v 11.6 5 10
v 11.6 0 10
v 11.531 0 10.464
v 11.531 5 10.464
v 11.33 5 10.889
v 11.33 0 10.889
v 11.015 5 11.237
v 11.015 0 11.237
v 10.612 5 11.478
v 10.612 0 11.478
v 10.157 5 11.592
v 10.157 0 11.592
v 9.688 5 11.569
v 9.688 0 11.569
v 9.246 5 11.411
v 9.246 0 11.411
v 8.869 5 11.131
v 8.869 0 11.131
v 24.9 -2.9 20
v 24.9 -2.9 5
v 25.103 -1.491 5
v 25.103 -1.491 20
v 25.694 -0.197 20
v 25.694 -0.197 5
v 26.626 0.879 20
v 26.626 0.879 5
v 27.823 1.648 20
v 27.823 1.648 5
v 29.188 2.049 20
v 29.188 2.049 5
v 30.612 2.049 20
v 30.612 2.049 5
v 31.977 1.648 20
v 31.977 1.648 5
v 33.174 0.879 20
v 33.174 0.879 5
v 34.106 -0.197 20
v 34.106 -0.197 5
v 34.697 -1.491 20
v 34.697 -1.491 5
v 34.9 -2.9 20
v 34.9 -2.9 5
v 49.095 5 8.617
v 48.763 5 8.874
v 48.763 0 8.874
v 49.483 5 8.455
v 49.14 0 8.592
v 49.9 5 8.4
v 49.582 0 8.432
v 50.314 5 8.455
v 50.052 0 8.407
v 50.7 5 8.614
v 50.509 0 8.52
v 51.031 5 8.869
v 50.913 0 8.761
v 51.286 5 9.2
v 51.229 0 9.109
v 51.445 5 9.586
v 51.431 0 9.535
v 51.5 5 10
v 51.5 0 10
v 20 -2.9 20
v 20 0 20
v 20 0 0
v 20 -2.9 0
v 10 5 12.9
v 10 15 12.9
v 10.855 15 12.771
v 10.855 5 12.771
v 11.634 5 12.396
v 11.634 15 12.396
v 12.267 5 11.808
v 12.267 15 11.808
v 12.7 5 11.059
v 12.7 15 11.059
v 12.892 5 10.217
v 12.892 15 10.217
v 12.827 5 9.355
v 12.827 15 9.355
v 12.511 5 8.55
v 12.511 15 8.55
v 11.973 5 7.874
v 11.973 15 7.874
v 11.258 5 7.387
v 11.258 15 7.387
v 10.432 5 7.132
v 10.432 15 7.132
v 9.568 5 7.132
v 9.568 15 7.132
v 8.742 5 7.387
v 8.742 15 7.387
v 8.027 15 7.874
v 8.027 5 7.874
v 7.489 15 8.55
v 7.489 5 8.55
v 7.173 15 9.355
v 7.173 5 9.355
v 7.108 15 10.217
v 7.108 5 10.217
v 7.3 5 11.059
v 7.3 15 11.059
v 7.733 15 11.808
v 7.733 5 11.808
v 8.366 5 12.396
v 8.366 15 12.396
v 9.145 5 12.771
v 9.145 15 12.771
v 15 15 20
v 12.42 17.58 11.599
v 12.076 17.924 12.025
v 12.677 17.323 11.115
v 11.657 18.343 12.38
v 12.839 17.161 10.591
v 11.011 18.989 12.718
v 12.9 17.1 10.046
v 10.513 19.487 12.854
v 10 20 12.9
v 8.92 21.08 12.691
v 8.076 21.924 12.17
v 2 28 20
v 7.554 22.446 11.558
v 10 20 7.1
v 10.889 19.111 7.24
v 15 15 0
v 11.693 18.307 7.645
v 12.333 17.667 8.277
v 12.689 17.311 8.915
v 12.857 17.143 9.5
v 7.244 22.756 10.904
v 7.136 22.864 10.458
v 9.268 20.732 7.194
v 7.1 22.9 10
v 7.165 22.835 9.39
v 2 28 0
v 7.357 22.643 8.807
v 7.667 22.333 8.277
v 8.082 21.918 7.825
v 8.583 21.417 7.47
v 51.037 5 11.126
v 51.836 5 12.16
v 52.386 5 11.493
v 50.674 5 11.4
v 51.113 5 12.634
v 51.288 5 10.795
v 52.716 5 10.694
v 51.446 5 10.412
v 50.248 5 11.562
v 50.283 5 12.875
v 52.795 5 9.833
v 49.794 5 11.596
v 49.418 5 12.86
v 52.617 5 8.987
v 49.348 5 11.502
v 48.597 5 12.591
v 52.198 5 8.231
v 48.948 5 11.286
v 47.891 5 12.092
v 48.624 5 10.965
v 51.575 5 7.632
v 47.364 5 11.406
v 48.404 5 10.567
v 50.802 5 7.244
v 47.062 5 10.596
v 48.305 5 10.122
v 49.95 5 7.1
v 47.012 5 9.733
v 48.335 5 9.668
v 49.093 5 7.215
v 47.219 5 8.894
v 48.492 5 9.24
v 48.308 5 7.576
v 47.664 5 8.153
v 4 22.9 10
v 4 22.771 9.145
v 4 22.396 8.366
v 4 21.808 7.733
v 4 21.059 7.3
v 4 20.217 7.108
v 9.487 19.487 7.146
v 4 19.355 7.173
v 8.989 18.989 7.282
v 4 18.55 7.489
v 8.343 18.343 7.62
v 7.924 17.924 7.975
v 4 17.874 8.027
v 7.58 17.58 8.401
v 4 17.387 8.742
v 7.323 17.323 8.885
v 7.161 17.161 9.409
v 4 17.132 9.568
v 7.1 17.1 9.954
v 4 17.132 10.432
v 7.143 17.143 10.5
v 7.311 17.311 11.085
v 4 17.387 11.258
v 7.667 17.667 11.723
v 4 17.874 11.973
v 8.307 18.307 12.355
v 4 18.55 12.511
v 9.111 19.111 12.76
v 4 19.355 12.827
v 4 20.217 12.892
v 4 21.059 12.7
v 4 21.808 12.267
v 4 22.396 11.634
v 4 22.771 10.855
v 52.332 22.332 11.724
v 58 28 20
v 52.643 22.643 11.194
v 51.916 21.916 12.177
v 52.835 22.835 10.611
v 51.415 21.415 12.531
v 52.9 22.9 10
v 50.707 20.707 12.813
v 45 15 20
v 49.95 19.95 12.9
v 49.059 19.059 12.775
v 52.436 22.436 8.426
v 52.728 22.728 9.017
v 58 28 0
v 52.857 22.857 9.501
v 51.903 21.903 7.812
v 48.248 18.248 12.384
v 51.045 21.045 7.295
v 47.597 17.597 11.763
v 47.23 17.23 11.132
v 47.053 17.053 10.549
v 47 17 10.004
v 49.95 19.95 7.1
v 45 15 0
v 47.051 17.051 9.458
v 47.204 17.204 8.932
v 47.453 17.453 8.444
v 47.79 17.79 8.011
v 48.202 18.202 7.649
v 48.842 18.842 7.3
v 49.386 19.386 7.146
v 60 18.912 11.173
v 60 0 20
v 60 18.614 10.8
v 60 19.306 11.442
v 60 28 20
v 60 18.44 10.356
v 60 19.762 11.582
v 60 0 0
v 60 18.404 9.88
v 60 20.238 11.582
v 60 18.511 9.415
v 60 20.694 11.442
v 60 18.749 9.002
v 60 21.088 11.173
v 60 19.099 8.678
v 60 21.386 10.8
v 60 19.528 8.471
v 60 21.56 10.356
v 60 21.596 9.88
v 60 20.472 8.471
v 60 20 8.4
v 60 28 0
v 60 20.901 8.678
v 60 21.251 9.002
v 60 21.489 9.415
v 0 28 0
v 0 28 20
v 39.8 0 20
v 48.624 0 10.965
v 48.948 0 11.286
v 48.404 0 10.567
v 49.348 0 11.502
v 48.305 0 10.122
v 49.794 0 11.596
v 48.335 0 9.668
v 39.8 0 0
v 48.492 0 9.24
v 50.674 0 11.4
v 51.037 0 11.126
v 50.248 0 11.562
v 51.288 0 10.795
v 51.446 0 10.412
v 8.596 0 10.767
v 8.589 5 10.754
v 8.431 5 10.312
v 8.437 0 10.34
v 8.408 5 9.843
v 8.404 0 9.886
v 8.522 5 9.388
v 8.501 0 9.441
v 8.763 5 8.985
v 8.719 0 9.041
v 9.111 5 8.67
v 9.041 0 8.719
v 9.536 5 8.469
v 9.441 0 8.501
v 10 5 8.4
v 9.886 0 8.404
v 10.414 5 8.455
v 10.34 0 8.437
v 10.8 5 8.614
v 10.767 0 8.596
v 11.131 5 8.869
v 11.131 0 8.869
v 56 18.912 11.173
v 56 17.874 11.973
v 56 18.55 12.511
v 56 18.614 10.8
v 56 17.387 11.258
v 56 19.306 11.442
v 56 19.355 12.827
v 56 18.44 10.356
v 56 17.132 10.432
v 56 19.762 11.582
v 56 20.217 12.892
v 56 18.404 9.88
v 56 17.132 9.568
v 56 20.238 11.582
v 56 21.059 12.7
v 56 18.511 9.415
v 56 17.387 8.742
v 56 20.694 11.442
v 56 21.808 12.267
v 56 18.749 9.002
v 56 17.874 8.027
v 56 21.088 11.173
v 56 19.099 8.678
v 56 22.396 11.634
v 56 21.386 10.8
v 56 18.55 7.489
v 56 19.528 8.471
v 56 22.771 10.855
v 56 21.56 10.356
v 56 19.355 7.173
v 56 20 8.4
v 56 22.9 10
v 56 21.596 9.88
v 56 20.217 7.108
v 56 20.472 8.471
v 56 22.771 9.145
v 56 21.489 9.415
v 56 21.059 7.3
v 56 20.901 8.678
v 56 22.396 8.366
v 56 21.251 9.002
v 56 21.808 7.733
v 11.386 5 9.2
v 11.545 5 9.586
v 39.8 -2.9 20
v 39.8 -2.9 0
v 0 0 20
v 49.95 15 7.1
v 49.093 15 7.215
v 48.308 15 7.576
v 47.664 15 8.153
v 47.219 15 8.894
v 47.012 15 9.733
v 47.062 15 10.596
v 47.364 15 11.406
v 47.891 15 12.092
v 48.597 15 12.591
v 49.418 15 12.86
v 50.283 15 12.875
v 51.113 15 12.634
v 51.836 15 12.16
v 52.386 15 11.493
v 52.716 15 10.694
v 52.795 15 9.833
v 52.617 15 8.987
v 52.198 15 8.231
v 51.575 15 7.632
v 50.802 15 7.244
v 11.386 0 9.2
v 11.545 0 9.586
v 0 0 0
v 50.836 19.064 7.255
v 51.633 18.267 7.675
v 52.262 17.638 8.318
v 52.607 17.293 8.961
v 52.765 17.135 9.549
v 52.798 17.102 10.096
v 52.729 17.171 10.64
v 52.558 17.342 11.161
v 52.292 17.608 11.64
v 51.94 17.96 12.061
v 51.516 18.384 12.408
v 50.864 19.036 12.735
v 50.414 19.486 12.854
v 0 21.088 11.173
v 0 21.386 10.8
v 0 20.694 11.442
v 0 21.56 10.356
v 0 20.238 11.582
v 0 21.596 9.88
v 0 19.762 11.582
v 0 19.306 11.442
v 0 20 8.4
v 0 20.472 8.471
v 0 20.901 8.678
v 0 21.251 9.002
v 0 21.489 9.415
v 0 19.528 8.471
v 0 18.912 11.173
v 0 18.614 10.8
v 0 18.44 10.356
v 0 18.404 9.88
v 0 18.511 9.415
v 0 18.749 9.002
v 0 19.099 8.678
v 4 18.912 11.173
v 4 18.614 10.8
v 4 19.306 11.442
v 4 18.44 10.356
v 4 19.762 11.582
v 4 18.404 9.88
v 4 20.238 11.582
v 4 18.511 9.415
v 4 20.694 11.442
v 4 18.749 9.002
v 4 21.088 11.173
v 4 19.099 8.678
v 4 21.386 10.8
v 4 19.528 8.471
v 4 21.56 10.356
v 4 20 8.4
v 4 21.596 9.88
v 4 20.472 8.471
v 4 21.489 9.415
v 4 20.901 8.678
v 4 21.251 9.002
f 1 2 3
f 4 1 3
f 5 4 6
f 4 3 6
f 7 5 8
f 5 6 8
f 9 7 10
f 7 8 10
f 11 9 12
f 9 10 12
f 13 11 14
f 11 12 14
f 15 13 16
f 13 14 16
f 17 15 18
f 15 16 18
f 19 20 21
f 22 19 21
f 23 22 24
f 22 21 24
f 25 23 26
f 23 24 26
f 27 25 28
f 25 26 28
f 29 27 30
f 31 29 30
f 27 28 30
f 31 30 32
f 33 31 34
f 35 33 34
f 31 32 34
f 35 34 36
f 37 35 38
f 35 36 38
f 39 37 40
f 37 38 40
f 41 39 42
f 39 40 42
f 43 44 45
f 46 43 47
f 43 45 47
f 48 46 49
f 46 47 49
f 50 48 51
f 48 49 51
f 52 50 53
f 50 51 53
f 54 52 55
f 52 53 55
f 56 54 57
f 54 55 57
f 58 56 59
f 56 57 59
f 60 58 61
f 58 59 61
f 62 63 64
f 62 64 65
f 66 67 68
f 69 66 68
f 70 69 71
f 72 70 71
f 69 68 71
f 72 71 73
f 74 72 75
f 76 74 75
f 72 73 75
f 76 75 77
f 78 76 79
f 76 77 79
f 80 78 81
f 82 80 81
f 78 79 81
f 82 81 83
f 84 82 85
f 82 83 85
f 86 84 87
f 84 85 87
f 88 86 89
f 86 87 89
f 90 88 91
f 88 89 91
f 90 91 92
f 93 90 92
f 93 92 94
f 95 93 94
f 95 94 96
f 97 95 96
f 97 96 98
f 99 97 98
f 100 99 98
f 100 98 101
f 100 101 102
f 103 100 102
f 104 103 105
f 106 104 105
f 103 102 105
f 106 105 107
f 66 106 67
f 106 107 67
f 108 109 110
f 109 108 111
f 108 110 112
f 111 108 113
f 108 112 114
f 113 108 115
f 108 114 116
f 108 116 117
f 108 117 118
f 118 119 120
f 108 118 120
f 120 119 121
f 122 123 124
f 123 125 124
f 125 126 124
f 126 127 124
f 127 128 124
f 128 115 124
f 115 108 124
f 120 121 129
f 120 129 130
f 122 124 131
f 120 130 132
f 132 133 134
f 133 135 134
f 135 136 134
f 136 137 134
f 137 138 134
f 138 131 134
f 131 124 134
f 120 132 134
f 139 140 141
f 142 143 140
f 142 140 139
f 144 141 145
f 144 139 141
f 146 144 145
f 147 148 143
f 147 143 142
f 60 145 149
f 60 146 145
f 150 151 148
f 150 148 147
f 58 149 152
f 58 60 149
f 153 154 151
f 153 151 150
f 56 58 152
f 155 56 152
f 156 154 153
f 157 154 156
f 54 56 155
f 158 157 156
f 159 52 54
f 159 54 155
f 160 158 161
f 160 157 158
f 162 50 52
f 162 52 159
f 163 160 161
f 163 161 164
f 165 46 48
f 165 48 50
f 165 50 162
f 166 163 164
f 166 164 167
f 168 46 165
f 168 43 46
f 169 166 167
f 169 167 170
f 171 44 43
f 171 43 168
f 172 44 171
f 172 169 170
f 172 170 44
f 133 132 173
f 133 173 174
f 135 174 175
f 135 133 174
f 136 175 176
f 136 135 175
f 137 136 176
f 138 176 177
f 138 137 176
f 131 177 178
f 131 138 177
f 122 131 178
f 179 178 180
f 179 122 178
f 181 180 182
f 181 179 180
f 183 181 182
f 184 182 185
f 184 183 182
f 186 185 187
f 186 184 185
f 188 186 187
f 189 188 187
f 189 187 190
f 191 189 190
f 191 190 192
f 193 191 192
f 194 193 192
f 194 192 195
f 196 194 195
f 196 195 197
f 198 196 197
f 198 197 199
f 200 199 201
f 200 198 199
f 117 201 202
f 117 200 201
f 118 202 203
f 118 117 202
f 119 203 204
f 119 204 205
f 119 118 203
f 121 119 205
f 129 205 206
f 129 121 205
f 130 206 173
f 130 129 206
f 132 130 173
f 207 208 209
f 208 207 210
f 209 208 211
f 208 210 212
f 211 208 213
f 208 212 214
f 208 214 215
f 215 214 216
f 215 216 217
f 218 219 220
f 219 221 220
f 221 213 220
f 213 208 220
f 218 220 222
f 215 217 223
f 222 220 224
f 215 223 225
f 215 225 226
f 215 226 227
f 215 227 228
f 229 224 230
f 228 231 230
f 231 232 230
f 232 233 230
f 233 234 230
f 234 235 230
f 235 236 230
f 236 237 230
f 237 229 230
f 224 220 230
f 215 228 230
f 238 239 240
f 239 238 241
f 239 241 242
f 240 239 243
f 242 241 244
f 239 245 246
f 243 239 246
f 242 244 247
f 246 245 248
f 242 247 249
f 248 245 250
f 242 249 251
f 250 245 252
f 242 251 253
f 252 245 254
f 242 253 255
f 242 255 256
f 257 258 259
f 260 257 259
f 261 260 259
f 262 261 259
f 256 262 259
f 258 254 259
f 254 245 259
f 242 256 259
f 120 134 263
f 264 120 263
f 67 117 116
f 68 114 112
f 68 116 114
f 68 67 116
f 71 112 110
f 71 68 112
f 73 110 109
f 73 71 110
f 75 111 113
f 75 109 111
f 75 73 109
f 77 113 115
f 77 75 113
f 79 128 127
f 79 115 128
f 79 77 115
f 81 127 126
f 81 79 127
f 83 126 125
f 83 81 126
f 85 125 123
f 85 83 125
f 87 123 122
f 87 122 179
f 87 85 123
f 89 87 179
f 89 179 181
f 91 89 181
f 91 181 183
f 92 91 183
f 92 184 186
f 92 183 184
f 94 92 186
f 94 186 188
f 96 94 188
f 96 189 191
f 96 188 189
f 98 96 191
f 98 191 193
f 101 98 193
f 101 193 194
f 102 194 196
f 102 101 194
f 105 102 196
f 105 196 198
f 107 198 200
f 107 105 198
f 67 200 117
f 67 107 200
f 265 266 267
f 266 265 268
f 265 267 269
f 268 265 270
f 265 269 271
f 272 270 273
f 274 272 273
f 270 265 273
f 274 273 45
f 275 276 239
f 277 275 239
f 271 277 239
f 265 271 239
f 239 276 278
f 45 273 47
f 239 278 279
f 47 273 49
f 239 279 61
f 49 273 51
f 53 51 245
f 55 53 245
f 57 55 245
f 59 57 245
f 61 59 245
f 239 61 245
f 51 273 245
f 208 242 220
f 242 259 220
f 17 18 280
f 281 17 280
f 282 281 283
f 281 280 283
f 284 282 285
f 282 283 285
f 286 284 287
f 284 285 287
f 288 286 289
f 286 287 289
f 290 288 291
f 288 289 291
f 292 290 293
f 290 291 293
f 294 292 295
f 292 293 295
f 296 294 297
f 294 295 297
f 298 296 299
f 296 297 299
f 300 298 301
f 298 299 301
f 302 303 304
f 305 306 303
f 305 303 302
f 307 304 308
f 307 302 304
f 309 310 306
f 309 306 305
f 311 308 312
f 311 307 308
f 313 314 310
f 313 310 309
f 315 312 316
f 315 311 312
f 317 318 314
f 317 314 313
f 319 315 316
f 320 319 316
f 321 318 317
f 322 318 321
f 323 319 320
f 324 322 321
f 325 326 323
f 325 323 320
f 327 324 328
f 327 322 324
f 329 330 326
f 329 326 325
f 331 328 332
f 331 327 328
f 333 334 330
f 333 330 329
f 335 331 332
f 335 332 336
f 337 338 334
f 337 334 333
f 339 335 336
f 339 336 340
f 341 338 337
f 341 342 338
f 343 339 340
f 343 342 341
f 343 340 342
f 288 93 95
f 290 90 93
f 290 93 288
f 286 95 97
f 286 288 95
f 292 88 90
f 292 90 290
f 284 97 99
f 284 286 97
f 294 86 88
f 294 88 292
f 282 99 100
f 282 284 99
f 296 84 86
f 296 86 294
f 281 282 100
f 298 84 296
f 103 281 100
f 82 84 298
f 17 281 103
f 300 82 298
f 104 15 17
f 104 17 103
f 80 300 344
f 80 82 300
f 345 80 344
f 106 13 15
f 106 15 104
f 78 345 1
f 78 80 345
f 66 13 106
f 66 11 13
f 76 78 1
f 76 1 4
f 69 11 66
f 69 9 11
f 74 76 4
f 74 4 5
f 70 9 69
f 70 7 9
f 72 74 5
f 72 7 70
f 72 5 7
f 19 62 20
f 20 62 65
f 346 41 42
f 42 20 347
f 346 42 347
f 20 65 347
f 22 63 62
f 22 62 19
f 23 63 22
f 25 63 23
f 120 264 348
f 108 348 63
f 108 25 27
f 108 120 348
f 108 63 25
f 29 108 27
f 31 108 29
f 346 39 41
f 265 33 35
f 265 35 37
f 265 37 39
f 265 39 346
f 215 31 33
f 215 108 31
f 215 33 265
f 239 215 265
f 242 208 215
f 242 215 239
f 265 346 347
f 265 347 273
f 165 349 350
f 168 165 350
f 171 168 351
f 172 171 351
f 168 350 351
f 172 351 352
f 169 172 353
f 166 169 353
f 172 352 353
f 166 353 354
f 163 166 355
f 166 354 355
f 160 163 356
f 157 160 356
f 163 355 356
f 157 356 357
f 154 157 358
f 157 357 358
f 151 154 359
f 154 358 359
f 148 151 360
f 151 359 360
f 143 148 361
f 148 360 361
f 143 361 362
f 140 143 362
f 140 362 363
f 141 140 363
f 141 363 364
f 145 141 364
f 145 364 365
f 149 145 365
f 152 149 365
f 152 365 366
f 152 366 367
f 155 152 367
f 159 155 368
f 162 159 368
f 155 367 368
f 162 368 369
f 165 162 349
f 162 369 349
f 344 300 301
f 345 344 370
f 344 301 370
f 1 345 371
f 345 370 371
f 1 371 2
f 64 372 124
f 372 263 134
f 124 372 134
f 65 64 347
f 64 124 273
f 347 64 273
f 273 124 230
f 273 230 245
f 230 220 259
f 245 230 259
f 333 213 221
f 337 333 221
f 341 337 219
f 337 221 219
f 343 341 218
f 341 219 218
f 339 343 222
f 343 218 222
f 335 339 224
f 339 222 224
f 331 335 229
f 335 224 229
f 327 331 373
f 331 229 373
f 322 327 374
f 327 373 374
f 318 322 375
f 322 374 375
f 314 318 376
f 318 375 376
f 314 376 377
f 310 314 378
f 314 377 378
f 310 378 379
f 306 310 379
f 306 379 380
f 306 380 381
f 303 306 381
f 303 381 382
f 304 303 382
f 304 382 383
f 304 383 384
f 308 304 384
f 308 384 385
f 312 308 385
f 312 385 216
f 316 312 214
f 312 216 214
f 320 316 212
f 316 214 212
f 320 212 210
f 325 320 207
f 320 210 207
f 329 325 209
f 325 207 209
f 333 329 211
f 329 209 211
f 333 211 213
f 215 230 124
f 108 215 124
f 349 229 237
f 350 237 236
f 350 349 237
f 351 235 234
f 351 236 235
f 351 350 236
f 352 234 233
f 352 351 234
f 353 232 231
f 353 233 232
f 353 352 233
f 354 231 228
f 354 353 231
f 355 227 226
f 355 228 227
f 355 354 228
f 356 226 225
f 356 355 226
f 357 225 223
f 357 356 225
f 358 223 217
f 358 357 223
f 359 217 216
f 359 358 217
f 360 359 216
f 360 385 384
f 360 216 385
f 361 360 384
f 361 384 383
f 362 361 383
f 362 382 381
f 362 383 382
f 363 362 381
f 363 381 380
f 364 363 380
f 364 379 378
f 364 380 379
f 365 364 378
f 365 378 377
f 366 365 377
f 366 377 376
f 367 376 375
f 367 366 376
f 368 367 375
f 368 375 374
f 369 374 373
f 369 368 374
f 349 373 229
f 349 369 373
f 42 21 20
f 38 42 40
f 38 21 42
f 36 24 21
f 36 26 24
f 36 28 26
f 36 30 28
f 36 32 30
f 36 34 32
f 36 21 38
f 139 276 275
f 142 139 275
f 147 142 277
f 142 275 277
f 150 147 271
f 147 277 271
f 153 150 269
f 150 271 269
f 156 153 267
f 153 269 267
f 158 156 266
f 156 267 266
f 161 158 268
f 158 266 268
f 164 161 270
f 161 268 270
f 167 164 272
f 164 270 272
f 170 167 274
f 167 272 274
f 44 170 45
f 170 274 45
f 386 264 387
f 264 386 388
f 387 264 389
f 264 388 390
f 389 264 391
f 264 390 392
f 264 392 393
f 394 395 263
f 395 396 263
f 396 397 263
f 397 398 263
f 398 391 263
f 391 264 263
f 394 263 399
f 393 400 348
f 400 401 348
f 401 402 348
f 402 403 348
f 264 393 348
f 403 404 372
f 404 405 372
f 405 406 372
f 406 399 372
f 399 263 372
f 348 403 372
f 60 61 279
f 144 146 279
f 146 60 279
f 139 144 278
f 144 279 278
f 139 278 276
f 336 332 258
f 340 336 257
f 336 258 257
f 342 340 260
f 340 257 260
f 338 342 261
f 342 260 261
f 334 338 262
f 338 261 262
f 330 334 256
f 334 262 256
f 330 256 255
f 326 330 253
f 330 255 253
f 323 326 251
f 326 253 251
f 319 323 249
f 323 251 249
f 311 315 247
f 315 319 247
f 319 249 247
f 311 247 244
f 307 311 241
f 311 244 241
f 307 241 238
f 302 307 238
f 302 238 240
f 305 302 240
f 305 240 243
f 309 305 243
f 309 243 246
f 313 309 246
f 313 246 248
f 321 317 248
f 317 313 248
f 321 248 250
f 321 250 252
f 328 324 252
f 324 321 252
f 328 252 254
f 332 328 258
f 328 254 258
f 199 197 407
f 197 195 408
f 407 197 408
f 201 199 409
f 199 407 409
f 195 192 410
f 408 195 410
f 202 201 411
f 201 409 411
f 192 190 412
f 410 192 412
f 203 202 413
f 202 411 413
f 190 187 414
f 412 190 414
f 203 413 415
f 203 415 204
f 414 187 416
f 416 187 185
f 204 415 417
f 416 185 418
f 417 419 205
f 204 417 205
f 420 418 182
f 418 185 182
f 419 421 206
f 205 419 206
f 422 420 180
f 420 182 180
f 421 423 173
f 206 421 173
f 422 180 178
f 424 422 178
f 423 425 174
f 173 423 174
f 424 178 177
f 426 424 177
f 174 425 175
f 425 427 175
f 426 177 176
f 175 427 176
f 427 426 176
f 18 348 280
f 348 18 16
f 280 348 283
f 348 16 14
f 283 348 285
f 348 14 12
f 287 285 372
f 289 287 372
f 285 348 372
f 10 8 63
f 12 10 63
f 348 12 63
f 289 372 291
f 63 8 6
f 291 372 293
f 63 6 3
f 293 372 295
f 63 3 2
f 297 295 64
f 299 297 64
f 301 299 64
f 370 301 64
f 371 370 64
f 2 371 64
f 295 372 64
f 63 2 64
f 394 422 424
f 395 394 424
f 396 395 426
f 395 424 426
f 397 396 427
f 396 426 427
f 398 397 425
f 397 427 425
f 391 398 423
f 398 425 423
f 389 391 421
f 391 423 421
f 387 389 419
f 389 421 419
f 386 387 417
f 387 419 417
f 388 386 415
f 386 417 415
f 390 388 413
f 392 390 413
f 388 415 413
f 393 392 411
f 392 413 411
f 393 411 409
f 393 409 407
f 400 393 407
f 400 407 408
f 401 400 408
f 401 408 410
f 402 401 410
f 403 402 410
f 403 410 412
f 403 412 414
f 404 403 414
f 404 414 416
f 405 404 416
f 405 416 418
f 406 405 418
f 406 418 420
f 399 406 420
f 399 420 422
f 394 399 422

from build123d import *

# Parameters (mm, degrees)
BOSS_EXTRU_1_DEPTH           = 5
BOSS_EXTRU_2_DEPTH           = 15
ESQUISSE3_R                  = 1.6
ENL_V_MAT_EXTRU_1_DEPTH      = 70.166465863
ENL_V_MAT_EXTRU_2_DEPTH      = 26
ENL_V_MAT_EXTRU_2_DEPTH_BACK = 26
ESQUISSE4_R                  = 2.9
ESQUISSE4_R_2                = 1.6
ESQUISSE5_R                  = 1.6
ENL_V_MAT_EXTRU_3_DEPTH      = 25
ENL_V_MAT_EXTRU_4_DEPTH      = 25
ENL_V_MAT_EXTRU_4_DEPTH_BACK = 10
ESQUISSE6_R                  = 2.9
ESQUISSE6_R_2                = 1.6


with BuildPart() as part:
    # Esquisse1 → Boss.-Extru.1 (new body)
    with BuildSketch(Plane.XY):
        Polygon((15, 15), (2, 28), (0, 28), (0, 0), (20, 0), (20, -2.9), (39.8, -2.9), (39.8, 0), (60, 0), (60, 28), (58, 28), (45, 15), align=None)
    extrude(amount=BOSS_EXTRU_1_DEPTH)

    # Esquisse2 → Boss.-Extru.2 (add)
    with BuildSketch(Plane.XY.offset(5)):
        with BuildLine():
            Line((2, 28), (0, 28))
            Line((0, 28), (0, 0))
            Line((0, 0), (20, 0))
            Line((20, 0), (20, -2.9))
            Line((20, -2.9), (24.9, -2.9))
            ThreePointArc((24.9, -2.9), (29.9, 2.1), (34.9, -2.9))
            Line((34.9, -2.9), (39.8, -2.9))
            Line((39.8, -2.9), (39.8, 0))
            Line((39.8, 0), (60, 0))
            Line((60, 0), (60, 28))
            Line((60, 28), (58, 28))
            Line((58, 28), (45, 15))
            Line((45, 15), (15, 15))
            Line((15, 15), (2, 28))
        make_face()
    extrude(amount=BOSS_EXTRU_2_DEPTH)

    # Esquisse3 → Enlèv. mat.-Extru.1 (cut, through all)
    with BuildSketch(Plane(origin=(60, 0, 0), x_dir=(0, 0, -1), z_dir=(1, 0, 0))):
        with Locations((-10, 20)):
            Circle(ESQUISSE3_R)
    extrude(amount=-ENL_V_MAT_EXTRU_1_DEPTH, mode=Mode.SUBTRACT)

    # Esquisse4 → Enlèv. mat.-Extru.2 (cut, two sides: drawn at the far end of the back side and taken through both)
    with BuildSketch(Plane.ZY.offset(-30).offset(-ENL_V_MAT_EXTRU_2_DEPTH_BACK)):
        with Locations((10, 20)):
            Circle(ESQUISSE4_R)
        with Locations((10, 20)):
            Circle(ESQUISSE4_R_2, mode=Mode.SUBTRACT)
    extrude(amount=ENL_V_MAT_EXTRU_2_DEPTH + ENL_V_MAT_EXTRU_2_DEPTH_BACK, mode=Mode.SUBTRACT)

    # Esquisse5 → Enlèv. mat.-Extru.3 (cut)
    with BuildSketch(Plane.XZ):
        with Locations((49.9, 10)):
            Circle(ESQUISSE5_R)
        with Locations((10, 10)):
            Circle(ESQUISSE5_R)
    extrude(amount=-ENL_V_MAT_EXTRU_3_DEPTH, mode=Mode.SUBTRACT)

    # Esquisse6 → Enlèv. mat.-Extru.4 (cut, two sides: drawn at the far end of the back side and taken through both)
    # profile 1 of 2: a face of its own
    with BuildSketch(Plane(origin=(0, 15, 0), x_dir=(1, 0, 0), z_dir=(0, 1, 0)).offset(-ENL_V_MAT_EXTRU_4_DEPTH_BACK)):
        with Locations((10, -10)):
            Circle(ESQUISSE6_R)
        with Locations((10, -10)):
            Circle(ESQUISSE6_R_2, mode=Mode.SUBTRACT)
    # profile 2 of 2: a face of its own
    with BuildSketch(Plane(origin=(0, 15, 0), x_dir=(1, 0, 0), z_dir=(0, 1, 0)).offset(-ENL_V_MAT_EXTRU_4_DEPTH_BACK)):
        with Locations((49.9, -10)):
            Circle(ESQUISSE6_R)
        with Locations((49.9, -10)):
            Circle(ESQUISSE6_R_2, mode=Mode.SUBTRACT)
    extrude(amount=ENL_V_MAT_EXTRU_4_DEPTH + ENL_V_MAT_EXTRU_4_DEPTH_BACK, mode=Mode.SUBTRACT)


solid = part.part
